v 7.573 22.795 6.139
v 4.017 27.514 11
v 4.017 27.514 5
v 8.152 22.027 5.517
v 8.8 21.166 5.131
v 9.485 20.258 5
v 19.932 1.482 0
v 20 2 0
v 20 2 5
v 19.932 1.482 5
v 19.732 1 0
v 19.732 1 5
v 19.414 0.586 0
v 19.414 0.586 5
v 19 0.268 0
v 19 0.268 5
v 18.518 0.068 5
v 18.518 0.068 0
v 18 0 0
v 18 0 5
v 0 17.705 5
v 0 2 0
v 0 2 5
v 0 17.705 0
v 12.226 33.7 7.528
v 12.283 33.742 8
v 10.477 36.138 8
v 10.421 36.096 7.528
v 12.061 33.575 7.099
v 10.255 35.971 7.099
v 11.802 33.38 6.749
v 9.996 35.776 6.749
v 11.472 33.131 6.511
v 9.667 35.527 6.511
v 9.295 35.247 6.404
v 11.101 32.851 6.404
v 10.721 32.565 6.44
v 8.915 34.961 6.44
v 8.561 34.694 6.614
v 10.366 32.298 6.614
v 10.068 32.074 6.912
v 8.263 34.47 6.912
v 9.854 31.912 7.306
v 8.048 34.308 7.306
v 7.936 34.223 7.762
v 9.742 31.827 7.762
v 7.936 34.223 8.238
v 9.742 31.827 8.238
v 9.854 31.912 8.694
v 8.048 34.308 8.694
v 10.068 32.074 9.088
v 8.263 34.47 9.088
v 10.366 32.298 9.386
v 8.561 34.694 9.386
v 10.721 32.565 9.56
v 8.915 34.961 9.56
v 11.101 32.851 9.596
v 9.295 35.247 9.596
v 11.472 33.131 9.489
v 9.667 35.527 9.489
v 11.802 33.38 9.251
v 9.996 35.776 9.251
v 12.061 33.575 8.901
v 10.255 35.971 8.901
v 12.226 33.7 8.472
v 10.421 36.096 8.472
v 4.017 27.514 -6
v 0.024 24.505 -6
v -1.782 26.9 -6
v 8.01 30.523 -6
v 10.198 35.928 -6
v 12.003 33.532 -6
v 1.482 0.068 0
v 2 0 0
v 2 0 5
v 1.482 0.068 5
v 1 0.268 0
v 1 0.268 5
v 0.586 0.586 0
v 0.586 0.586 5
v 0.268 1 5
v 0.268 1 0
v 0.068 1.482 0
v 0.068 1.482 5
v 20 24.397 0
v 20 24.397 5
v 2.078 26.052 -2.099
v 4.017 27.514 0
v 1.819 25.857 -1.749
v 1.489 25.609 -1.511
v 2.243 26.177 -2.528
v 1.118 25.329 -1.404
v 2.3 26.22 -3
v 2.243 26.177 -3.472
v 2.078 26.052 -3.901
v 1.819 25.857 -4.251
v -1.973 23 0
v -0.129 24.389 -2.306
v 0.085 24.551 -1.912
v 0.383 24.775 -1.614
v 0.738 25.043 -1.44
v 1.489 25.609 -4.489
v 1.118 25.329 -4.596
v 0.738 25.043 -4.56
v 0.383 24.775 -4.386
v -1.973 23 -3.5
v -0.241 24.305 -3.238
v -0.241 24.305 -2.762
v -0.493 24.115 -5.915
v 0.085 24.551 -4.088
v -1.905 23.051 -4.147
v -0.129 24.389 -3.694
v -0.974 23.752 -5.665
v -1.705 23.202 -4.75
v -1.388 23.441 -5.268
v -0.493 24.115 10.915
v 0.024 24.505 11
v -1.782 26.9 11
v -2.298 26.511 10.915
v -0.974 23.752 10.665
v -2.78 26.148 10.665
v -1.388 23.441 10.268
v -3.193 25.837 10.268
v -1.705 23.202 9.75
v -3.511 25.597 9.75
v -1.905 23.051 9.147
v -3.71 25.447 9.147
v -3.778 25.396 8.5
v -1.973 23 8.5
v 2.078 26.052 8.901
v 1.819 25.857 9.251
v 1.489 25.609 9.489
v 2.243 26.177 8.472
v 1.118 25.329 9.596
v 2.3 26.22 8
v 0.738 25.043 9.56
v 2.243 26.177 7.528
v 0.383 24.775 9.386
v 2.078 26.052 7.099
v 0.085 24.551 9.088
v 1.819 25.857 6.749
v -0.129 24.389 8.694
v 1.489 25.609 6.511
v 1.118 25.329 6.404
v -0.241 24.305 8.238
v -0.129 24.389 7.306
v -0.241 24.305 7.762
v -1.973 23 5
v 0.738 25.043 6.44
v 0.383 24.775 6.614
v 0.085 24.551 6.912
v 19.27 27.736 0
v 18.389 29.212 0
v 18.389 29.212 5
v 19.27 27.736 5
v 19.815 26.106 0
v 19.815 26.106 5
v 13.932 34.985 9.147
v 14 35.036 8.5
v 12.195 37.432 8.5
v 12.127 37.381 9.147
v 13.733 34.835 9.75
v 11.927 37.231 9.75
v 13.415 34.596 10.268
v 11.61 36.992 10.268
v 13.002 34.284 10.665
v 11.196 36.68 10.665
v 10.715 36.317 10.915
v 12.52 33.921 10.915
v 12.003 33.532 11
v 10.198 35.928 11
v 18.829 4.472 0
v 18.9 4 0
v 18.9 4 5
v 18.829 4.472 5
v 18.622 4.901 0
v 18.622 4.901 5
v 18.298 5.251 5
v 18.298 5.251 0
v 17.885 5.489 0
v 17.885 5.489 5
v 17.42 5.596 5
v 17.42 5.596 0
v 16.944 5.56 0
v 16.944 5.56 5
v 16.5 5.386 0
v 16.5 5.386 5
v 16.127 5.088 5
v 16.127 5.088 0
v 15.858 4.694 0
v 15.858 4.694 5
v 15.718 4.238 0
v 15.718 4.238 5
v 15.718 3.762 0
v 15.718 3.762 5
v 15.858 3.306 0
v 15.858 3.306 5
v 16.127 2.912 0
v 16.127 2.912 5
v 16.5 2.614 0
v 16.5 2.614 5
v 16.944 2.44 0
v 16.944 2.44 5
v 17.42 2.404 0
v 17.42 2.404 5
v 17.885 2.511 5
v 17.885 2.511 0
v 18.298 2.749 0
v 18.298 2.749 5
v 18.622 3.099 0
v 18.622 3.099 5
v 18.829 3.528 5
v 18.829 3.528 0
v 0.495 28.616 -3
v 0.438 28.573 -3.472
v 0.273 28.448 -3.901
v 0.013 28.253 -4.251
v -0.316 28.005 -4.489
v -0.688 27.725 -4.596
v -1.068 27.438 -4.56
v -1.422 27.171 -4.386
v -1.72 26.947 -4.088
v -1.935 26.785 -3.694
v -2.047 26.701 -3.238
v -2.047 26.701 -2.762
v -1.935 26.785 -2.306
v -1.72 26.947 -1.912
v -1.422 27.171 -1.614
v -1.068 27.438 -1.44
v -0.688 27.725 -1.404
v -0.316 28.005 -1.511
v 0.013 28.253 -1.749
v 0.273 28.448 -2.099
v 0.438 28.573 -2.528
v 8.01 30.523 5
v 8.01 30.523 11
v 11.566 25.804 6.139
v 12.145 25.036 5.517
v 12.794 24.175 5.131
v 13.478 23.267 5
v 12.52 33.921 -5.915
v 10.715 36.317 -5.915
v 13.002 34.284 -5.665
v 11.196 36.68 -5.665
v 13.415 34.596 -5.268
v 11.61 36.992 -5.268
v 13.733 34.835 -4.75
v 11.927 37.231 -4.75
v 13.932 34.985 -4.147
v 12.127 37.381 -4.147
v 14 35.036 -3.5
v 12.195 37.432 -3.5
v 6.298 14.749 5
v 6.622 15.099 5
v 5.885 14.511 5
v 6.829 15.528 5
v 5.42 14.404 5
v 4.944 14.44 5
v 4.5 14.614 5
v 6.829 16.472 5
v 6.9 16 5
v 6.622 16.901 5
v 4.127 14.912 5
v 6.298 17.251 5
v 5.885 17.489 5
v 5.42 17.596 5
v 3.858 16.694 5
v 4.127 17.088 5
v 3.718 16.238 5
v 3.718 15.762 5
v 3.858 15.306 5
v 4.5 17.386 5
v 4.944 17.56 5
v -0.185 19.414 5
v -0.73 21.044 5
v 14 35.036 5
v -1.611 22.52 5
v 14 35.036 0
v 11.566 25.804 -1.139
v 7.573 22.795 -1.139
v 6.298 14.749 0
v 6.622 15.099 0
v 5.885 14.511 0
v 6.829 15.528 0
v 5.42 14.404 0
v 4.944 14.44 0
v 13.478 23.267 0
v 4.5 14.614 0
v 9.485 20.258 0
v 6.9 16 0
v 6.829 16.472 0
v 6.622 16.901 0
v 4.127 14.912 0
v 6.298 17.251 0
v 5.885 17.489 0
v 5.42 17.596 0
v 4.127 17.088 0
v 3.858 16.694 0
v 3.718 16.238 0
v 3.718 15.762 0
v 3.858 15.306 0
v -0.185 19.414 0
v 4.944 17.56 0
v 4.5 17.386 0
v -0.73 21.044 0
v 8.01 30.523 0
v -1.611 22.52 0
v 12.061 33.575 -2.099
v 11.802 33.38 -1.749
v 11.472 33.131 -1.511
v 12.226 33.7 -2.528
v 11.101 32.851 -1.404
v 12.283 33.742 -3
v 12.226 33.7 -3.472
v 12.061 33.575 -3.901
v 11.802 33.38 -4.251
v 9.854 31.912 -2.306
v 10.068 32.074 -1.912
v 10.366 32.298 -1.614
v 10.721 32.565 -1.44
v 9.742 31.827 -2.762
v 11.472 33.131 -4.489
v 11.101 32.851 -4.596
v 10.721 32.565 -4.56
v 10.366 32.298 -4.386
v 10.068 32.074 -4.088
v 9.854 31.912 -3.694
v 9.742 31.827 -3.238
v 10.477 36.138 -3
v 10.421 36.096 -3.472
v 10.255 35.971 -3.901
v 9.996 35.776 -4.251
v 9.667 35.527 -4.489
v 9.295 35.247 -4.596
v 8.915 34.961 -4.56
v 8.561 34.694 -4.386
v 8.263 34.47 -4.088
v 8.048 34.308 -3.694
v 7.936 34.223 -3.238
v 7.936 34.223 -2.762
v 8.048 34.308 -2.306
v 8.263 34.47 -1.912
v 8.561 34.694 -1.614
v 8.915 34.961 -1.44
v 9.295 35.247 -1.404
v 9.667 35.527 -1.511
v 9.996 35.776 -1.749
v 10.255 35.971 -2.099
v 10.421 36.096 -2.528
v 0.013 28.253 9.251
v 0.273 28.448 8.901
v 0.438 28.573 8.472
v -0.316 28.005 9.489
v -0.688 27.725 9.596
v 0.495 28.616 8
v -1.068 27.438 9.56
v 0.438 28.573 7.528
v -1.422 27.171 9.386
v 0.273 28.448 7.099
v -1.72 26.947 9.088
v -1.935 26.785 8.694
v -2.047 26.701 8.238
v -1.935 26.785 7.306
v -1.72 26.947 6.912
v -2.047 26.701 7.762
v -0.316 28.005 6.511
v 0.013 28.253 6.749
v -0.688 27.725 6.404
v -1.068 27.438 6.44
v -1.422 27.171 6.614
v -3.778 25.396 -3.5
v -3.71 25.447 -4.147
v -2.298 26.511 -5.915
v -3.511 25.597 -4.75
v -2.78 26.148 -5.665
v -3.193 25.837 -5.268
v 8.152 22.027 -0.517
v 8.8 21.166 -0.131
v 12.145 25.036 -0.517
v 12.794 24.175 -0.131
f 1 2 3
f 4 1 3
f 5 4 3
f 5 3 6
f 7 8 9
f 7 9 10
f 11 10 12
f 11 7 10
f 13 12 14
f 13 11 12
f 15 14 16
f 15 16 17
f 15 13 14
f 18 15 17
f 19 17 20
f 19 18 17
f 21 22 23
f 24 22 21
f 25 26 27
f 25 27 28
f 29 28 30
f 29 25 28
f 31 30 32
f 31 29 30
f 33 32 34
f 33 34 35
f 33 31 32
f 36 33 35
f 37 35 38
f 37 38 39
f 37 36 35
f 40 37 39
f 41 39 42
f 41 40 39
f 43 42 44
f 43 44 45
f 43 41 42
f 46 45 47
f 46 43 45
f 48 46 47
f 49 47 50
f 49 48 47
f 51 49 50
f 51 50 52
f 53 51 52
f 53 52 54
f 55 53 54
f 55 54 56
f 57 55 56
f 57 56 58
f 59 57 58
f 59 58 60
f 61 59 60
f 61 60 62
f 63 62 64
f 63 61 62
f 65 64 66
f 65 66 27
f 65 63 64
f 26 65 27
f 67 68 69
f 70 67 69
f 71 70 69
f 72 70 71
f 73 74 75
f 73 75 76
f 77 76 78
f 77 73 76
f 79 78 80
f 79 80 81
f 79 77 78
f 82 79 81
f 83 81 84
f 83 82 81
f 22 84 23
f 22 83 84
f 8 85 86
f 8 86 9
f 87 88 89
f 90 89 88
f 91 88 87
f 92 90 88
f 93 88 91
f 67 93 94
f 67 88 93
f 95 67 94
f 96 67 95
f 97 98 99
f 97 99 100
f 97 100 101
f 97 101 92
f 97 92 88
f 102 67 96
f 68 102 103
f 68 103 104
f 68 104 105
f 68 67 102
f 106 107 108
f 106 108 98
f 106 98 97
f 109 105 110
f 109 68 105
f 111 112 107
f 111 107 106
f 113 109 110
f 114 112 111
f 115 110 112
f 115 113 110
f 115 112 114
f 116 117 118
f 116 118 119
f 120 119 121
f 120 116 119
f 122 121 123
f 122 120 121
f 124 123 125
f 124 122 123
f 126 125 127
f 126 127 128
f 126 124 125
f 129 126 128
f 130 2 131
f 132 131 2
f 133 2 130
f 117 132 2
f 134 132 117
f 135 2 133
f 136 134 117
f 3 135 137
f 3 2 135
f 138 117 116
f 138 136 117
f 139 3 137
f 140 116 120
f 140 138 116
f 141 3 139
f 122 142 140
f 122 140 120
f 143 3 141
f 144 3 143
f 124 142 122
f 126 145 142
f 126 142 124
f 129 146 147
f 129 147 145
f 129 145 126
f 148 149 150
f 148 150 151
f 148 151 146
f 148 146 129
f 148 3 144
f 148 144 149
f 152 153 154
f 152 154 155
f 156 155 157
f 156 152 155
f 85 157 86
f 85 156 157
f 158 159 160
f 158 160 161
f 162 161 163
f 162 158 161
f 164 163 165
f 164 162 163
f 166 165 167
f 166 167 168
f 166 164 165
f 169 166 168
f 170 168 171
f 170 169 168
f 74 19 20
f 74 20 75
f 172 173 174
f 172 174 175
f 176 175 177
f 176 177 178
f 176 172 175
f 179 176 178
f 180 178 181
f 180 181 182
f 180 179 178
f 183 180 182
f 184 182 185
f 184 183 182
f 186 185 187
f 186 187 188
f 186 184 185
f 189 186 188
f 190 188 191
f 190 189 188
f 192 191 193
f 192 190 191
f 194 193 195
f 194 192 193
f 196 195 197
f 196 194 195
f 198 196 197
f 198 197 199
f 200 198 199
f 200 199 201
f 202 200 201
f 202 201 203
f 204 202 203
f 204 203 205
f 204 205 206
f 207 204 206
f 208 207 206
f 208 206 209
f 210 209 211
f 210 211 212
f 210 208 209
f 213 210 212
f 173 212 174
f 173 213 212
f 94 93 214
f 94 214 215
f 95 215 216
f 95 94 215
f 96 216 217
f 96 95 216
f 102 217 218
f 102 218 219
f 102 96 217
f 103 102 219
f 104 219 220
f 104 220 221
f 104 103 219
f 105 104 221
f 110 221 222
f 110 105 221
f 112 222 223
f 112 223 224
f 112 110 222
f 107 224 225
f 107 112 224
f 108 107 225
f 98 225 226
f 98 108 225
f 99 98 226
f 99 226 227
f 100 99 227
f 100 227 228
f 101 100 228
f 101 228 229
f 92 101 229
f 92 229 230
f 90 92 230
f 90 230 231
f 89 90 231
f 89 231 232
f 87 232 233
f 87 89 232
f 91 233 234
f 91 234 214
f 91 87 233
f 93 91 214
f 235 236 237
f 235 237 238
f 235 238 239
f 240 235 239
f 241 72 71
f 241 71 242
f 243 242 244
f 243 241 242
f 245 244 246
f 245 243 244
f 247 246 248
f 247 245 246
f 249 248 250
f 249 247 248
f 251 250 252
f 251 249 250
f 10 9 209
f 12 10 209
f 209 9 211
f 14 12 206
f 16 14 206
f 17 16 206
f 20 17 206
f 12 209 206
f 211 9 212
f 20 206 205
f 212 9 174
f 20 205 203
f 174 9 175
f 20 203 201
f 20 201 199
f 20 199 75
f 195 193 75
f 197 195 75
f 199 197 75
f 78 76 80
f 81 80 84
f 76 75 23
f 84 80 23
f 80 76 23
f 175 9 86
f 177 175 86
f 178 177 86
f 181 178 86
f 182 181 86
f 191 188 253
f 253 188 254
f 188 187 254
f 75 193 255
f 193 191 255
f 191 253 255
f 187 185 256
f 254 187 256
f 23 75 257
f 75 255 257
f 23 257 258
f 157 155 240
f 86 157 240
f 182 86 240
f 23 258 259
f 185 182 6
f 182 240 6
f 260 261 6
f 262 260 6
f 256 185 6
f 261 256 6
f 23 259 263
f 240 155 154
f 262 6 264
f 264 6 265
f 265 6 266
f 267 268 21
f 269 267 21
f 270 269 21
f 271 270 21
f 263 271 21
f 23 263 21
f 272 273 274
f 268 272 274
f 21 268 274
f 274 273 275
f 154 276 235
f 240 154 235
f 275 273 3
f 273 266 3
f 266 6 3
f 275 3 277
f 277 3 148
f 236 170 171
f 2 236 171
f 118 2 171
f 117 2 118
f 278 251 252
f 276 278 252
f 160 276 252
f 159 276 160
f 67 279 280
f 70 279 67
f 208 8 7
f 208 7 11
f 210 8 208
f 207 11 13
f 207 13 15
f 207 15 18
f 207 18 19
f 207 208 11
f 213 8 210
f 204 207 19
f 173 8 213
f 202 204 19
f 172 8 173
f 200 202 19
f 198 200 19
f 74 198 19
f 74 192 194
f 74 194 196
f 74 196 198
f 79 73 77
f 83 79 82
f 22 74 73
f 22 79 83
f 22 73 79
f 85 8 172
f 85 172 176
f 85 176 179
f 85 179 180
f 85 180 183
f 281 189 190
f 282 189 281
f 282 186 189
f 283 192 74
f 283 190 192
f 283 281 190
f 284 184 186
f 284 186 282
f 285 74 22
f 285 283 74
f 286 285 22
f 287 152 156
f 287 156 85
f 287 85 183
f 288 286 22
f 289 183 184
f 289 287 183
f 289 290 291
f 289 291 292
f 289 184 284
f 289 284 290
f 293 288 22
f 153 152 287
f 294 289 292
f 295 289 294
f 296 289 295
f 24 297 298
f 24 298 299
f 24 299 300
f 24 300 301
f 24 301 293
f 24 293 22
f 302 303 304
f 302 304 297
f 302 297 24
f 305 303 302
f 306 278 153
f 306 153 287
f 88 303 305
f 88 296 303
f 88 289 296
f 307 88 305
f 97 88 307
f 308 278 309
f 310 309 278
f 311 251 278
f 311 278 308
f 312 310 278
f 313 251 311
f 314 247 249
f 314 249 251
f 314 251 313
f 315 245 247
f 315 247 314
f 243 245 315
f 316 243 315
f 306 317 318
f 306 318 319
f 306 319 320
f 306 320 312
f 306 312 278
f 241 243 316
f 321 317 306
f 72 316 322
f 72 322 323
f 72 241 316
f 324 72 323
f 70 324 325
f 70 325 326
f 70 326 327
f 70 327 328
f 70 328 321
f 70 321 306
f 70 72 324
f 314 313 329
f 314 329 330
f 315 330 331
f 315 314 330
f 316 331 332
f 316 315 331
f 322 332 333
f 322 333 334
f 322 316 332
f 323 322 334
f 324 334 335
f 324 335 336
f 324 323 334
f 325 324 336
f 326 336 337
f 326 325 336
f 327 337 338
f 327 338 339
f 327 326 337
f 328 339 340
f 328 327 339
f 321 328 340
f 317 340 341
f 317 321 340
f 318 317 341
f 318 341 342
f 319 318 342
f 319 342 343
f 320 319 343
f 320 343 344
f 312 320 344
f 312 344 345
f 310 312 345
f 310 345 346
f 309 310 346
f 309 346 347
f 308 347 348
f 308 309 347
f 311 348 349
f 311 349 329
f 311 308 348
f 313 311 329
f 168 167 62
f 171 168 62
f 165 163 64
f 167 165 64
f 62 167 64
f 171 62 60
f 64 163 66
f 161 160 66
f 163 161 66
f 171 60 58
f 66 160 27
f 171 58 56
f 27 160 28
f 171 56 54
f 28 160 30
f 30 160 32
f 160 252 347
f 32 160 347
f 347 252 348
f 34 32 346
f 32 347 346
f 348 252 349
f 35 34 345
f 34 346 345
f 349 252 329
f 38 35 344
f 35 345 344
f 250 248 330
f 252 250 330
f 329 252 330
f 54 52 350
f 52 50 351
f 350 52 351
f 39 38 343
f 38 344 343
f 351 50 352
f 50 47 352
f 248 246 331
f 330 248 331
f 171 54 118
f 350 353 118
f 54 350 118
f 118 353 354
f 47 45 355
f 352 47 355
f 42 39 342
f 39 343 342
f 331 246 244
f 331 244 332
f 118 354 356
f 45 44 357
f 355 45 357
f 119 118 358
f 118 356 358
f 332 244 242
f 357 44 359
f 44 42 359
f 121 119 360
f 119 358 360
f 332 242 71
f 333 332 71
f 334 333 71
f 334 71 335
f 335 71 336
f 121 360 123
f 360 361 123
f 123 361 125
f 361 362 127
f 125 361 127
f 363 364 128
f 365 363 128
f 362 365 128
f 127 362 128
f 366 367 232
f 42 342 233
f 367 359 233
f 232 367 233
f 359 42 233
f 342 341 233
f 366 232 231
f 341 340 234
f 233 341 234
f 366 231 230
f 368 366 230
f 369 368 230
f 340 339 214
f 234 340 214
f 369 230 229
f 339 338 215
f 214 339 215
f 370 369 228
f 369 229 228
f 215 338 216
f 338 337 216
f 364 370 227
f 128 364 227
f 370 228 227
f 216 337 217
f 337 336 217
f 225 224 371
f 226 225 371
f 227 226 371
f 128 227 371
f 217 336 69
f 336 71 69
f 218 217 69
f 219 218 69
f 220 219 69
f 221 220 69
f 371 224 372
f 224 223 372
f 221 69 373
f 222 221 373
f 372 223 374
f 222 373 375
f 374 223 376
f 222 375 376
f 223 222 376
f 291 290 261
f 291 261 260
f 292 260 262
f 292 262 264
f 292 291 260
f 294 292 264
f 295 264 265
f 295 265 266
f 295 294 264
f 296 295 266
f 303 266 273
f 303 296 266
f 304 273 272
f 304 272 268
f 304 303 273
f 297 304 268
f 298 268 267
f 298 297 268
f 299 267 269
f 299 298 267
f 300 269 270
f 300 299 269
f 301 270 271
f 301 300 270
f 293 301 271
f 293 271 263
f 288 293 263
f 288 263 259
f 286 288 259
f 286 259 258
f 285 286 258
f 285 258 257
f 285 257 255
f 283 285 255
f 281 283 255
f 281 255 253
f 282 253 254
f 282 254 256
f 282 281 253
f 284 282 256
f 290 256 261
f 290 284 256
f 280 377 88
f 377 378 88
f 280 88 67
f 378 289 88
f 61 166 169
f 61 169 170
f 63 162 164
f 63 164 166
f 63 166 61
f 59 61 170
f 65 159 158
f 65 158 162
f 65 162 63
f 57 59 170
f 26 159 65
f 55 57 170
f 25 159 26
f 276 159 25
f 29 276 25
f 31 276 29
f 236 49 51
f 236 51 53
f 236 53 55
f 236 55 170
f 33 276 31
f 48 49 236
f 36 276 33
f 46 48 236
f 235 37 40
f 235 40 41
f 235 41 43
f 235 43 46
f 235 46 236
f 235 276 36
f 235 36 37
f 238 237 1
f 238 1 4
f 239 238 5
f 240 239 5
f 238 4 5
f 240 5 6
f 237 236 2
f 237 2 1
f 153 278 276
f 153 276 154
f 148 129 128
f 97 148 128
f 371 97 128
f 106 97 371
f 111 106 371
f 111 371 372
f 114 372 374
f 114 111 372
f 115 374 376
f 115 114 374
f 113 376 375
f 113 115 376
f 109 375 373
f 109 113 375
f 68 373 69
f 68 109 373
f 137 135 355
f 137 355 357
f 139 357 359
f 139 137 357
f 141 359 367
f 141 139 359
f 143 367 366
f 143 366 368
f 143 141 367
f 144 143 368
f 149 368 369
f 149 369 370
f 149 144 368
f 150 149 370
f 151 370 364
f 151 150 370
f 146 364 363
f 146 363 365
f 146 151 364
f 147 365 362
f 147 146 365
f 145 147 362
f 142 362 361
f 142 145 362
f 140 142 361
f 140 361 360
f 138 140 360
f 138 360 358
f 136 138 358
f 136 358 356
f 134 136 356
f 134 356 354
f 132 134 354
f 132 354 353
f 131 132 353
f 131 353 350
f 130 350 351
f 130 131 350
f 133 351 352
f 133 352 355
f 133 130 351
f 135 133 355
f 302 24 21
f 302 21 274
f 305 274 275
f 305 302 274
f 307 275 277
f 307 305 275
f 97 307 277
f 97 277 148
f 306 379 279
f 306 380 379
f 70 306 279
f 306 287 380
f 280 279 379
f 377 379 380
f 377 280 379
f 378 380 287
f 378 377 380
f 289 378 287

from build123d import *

# Parameters (mm, degrees)
SKETCH_1_R      = 1.6
EXTRUDE_1_DEPTH = 5
SKETCH_2_R      = 1.6
EXTRUDE_2_DEPTH = 3
EXTRUDE_START   = -7.5
EXTRUDE_4_DEPTH = 5
FILLET_1_R      = 5


with BuildPart() as part:
    # 草图1 → 凸台-拉伸1 (new body)
    with BuildSketch(Plane.XY):
        with BuildLine():
            Line((0, 2), (0, 17.705362587))
            ThreePointArc((0, 17.705362587), (-0.413410758, 20.243799839), (-1.61091592, 22.519882772))
            Line((-1.61091592, 22.519882772), (-1.972710201, 23))
            Line((-1.972710201, 23), (14, 35.036300463))
            Line((14, 35.036300463), (18.38908408, 29.211789163))
            ThreePointArc((18.38908408, 29.211789163), (19.586589242, 26.935706229), (20, 24.397268977))
            Line((20, 24.397268977), (20, 2))
            ThreePointArc((20, 2), (19.414213562, 0.585786438), (18, 0))
            Line((18, 0), (2, 0))
            ThreePointArc((2, 0), (0.585786438, 0.585786438), (0, 2))
        make_face()
        with Locations((5.3, 16)):
            Circle(SKETCH_1_R, mode=Mode.SUBTRACT)
        with Locations((17.3, 4)):
            Circle(SKETCH_1_R, mode=Mode.SUBTRACT)
    extrude(amount=EXTRUDE_1_DEPTH)

    # 草图2 → 凸台-拉伸2 (add)
    with BuildSketch(Plane(origin=(-11.768988292, 15.617974969, 0), x_dir=(0.79863551, 0.601815023, 0), z_dir=(-0.601815023, 0.79863551, 0))):
        with BuildLine():
            Line((29.766269115, -11), (14.766269115, -11))
            ThreePointArc((14.766269115, -11), (12.998502162, -10.267766953), (12.266269115, -8.5))
            Line((12.266269115, -8.5), (12.266269115, 3.5))
            ThreePointArc((12.266269115, 3.5), (12.998502162, 5.267766953), (14.766269115, 6))
            Line((14.766269115, 6), (29.766269115, 6))
            ThreePointArc((29.766269115, 6), (31.534036068, 5.267766953), (32.266269115, 3.5))
            Line((32.266269115, 3.5), (32.266269115, -8.5))
            ThreePointArc((32.266269115, -8.5), (31.534036068, -10.267766953), (29.766269115, -11))
        make_face()
        with Locations((16.016269115, 3)):
            Circle(SKETCH_2_R, mode=Mode.SUBTRACT)
        with Locations((28.516269115, 3)):
            Circle(SKETCH_2_R, mode=Mode.SUBTRACT)
        with Locations((28.516269115, -8)):
            Circle(SKETCH_2_R, mode=Mode.SUBTRACT)
        with Locations((16.016269115, -8)):
            Circle(SKETCH_2_R, mode=Mode.SUBTRACT)
    extrude(amount=EXTRUDE_2_DEPTH)

    # 草图6 → 凸台-拉伸4 (add)
    with BuildSketch(Plane(origin=(25.768988292, 19.418325494, 0), x_dir=(0, 0, -1), z_dir=(0.79863551, 0.601815023, 0)).offset(EXTRUDE_START)):
        Polygon((-11, 19.555823366), (-5, 12.262745076), (-5, 19.555823366), align=None)
        Polygon((0, 12.262745076), (6, 19.555823366), (0, 19.555823366), align=None)
    extrude(amount=-EXTRUDE_4_DEPTH)

    # 圆角1
    fillet_1_edges = [part.edges().sort_by_distance(p)[0] for p in [
        (10.40272898, 23.193638931, 5),
        (10.40272898, 23.193638931, 0),
    ]]
    fillet(fillet_1_edges, radius=FILLET_1_R)


solid = part.part
